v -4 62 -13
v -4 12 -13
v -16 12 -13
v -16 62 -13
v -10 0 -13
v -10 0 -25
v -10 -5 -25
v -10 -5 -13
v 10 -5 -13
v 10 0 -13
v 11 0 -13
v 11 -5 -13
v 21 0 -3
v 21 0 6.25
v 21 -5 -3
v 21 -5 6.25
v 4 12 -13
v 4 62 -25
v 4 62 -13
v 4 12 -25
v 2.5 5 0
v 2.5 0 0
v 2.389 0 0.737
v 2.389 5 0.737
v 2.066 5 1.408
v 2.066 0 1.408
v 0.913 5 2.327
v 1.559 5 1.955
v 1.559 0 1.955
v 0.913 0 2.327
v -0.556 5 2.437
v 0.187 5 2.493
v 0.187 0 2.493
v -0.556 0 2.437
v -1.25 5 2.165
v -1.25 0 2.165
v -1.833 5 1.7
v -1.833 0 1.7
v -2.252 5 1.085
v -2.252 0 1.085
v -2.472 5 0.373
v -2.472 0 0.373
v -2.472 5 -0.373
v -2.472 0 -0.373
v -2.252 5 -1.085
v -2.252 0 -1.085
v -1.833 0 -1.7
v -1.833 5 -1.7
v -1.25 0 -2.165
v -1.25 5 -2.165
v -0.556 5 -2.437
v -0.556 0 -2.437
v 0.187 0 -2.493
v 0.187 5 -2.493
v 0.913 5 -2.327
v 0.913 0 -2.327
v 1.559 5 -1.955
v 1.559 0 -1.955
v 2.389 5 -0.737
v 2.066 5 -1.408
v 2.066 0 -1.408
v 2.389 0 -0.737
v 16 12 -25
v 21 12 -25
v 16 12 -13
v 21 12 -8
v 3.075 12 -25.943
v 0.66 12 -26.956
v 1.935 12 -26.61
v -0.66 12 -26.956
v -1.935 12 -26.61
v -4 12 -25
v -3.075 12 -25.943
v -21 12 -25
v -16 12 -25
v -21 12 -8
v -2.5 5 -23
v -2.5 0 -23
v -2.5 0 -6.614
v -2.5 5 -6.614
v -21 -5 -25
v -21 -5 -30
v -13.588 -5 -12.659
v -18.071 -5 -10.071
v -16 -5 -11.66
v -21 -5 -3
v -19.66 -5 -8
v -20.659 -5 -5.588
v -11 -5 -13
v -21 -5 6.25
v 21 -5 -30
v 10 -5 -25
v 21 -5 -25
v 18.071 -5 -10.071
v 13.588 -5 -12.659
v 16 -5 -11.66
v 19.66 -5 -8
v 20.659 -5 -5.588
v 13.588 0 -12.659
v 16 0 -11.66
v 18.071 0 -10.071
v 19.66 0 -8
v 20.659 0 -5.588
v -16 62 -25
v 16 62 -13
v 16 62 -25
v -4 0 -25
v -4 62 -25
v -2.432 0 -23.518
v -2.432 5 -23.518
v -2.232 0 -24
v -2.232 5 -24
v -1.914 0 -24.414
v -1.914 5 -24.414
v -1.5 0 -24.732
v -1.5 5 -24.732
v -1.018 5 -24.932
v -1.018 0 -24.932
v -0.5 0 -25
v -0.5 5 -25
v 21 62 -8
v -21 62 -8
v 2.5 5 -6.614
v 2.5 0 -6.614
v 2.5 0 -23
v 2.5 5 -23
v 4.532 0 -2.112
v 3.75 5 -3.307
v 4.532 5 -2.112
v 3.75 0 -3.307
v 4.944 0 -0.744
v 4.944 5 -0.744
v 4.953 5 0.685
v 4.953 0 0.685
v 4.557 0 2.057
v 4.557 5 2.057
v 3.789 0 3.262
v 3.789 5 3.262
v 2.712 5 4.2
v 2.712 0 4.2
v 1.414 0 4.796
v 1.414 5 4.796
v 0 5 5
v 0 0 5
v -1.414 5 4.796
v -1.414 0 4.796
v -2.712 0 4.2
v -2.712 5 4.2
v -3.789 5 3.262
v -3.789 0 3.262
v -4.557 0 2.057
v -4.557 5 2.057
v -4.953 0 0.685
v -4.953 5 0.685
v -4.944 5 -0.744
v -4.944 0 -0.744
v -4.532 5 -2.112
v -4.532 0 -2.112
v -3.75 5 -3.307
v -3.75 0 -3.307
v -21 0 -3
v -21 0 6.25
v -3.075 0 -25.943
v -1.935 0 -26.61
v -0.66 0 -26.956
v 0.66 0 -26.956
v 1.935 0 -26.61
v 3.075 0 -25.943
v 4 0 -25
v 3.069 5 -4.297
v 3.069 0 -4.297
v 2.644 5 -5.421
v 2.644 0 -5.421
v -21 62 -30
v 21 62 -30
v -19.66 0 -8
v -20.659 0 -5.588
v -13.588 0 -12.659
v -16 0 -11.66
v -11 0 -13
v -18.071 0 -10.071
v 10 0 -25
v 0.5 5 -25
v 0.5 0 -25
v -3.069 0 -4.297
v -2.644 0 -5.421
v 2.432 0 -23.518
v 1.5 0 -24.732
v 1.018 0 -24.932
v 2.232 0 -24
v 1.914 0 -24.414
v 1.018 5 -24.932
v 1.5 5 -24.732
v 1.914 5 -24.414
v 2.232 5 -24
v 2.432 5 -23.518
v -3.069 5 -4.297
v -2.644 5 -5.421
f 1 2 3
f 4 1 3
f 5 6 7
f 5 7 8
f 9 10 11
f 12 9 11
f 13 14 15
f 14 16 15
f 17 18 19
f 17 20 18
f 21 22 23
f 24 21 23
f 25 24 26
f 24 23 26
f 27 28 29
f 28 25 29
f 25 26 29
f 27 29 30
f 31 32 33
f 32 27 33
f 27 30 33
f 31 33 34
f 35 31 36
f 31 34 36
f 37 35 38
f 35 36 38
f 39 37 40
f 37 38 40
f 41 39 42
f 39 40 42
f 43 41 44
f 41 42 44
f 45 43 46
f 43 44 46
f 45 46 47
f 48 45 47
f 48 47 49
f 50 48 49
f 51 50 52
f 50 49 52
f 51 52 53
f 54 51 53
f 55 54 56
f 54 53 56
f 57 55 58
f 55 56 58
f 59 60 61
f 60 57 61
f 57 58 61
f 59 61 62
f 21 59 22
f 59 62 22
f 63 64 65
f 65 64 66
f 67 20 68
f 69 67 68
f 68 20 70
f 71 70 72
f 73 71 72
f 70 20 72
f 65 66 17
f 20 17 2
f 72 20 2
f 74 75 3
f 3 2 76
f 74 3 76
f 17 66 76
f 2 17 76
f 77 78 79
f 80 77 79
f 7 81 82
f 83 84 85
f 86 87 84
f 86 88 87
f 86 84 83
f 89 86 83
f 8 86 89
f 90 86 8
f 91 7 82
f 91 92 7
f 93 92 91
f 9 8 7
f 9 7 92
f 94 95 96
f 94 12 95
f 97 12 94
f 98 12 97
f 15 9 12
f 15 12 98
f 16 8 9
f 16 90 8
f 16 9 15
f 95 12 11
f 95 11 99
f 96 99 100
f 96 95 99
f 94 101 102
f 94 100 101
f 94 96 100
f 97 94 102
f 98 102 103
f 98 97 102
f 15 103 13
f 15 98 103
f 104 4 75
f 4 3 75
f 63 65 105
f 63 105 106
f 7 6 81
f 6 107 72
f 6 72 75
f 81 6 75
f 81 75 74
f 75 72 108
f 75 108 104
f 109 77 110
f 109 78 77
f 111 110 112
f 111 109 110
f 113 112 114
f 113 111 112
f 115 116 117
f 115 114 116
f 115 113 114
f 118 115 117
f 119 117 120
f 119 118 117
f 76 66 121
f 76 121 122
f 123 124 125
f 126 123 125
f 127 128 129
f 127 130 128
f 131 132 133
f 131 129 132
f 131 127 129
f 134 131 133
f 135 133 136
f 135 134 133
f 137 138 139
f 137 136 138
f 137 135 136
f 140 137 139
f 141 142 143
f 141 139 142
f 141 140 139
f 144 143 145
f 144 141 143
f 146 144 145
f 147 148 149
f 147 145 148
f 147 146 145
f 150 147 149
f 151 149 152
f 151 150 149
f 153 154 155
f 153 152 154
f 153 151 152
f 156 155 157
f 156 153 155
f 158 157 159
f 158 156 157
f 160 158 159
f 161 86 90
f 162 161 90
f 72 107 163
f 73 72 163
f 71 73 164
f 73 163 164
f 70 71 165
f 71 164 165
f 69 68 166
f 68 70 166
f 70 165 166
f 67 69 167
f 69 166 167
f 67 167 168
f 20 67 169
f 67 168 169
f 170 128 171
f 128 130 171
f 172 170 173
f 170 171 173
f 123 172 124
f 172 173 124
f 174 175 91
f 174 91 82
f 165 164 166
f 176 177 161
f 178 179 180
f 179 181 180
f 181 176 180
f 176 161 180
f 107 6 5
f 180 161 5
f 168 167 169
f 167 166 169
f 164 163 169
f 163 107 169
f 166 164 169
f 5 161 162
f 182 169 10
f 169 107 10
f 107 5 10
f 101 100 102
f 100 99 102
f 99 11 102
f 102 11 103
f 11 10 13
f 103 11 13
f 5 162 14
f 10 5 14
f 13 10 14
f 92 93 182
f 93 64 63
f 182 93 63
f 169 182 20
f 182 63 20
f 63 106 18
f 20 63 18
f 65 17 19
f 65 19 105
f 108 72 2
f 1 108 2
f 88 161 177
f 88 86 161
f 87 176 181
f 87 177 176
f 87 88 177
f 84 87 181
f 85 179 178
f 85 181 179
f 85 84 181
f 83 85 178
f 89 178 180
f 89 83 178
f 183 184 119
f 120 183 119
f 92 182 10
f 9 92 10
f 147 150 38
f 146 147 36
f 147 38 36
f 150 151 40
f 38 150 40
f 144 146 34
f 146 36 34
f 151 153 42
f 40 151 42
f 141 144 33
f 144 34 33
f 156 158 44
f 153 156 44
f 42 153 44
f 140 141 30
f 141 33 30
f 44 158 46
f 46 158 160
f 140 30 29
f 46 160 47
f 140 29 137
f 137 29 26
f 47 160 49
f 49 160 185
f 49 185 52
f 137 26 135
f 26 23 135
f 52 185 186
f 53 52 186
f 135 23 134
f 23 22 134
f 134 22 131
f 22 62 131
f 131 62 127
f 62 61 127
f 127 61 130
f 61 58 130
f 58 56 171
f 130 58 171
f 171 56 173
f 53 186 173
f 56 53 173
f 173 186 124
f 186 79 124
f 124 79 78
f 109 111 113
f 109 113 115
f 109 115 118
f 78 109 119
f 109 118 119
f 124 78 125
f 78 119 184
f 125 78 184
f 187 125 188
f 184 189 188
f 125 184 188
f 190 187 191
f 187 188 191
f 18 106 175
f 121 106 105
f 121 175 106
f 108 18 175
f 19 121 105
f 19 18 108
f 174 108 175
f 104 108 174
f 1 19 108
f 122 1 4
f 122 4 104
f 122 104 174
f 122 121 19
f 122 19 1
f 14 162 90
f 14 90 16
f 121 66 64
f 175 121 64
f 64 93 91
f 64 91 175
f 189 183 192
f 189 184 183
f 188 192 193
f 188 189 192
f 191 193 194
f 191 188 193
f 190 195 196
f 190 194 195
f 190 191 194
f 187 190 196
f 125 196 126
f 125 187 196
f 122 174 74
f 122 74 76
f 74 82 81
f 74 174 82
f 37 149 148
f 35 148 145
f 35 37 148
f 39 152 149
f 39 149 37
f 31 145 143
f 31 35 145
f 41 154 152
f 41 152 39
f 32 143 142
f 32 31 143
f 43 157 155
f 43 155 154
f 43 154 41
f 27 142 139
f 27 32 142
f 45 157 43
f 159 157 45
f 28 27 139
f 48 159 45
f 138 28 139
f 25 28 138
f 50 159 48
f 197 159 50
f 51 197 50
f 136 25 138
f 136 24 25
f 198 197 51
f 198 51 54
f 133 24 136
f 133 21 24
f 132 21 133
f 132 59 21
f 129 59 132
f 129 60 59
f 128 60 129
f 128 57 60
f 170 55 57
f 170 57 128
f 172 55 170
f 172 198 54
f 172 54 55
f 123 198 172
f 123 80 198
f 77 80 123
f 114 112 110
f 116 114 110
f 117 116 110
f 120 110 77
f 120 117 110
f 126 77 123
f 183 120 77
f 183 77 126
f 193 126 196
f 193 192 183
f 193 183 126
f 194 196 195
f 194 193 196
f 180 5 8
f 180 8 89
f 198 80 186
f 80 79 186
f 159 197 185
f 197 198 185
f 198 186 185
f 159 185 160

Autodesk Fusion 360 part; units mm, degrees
sketch "Sketch1" plane through (0, 0, 0) normal (0, 1, 0) x (1, 0, 0)
  circle A0 centre (0, 0) radius 2.5
  line L0 (2.5, 6.6144) -> (2.5, 23)
  line L1 (0.5, 25) -> (-0.5, 25)
  line L2 (-2.5, 23) -> (-2.5, 6.6144)
  arc A1 (-3.75, 3.3072) -> (3.75, 3.3072) centre (0, 0) ccw
  arc A2 (-3.75, 3.3072) -> (-2.5, 6.6144) centre (-7.5, 6.6144) ccw
  arc A3 (2.5, 6.6144) -> (3.75, 3.3072) centre (7.5, 6.6144) ccw
  arc A4 (-0.5, 25) -> (-2.5, 23) centre (-0.5, 23) ccw
  arc A5 (2.5, 23) -> (0.5, 25) centre (0.5, 23) ccw
  dimension "d1" = 5
  dimension "d2" = 10
  dimension "d5" = 5
  dimension "d6" = 2
extrude "Extrude1" add sketch "Sketch1" along normal blind 5 makes body 1
sketch "Sketch5" plane through (0, 0, 0) normal (0, -1, 0) x (1, 0, 0)
  circle A0 centre (0, 0) radius 2.5
  line L0 (2.5, -23) -> (2.5, -6.6144)
  arc A1 (3.75, -3.3072) -> (2.5, -6.6144) centre (7.5, -6.6144) ccw
  arc A2 (3.75, -3.3072) -> (-3.75, -3.3072) centre (0, 0) ccw
  arc A3 (-2.5, -6.6144) -> (-3.75, -3.3072) centre (-7.5, -6.6144) ccw
  line L1 (-2.5, -6.6144) -> (-2.5, -23)
  arc A4 (-2.5, -23) -> (-0.5, -25) centre (-0.5, -23) ccw
  line L2 (-0.5, -25) -> (0.5, -25)
  arc A5 (0.5, -25) -> (2.5, -23) centre (0.5, -23) ccw
  line L3 (0, 6.25) -> (21, 6.25)
  line L4 (21, 6.25) -> (21, -30)
  line L5 (21, -30) -> (0, -30)
  line L6 (0, 6.25) -> (-21, 6.25)
  line L7 (-21, 6.25) -> (-21, -30)
  line L8 (-21, -30) -> (0, -30)
  dimension "d42" = 6.25
  dimension "d49" = 21
  dimension "d50" = 36.25
extrude "Extrude5" add sketch "Sketch5" along normal blind 5 separate body contours A0 | L0 A1 A2 A3 L1 A4 L2 A5 | L3 L4 L5 L6 L7 L8 makes body 2
sketch "Sketch6" plane through (0, 0, 0) normal (0, 1, 0) x (-1, 0, 0)
  line L0 (21, 6.25) -> (-21, 6.25)
  line L1 (-21, 6.25) -> (-21, -30)
  line L2 (-21, -30) -> (21, -30)
  line L3 (21, -30) -> (21, 6.25)
  line L4 (21, -30) -> (16, -30)
  line L5 (16, -25) -> (21, -25)
  line L6 (21, -25) -> (21, -30)
  line L7 (16, -25) -> (4, -25)
  line L8 (-4, -25) -> (-21, -25)
  arc A0 (-4, -25) -> (4, -25) centre (0, -22) ccw
  dimension "d53" = 5
  dimension "d54" = 5
  dimension "d55" = 12
extrude "Extrude6" add sketch "Sketch6" along normal blind 12 contours L1 L2 L3 L4 L5 L6 L7 L8 A0 bodies 2
sketch "Sketch7" plane through (0, 12, 0) normal (0, 1, 0) x (-1, 0, 0)
  line L0 (-21, -25) -> (-21, -30)
  line L1 (-21, -30) -> (21, -30)
  line L2 (21, -30) -> (21, -25)
  line L3 (21, -25) -> (4, -25)
  arc A0 (-4, -25) -> (4, -25) centre (0, -22) ccw
  line L4 (-4, -25) -> (-21, -25)
  line L5 (16, -25) -> (4, -25)
  line L6 (4, -25) -> (4, -13)
  line L7 (4, -13) -> (16, -13)
  line L8 (16, -13) -> (16, -25)
  line L9 (-16, -25) -> (-4, -25)
  line L10 (-4, -25) -> (-4, -13)
  line L11 (-4, -13) -> (-16, -13)
  line L12 (-16, -13) -> (-16, -25)
  line L13 (21, -30) -> (-21, -30)
  line L14 (-21, -30) -> (-21, -8)
  line L15 (-21, -8) -> (21, -8)
  line L16 (21, -8) -> (21, -30)
  dimension "d60" = 12
  dimension "d61" = 12
  dimension "d62" = 42
  dimension "d63" = 22
extrude "Extrude7" add sketch "Sketch7" along normal blind 50 contours L0 L1 L2 L3 A0 L4 L5 L9 L13 L14 L16 | L3 A0 L4 L6 L7 L8 L10 L11 L12 L14 L15 L16 bodies 2
sketch "Sketch8" plane through (0, 0, 0) normal (0, 1, 0) x (-1, 0, 0)
  line L0 (4, -25) -> (21, -25)
  line L1 (21, -25) -> (21, 6.25)
  line L2 (21, 6.25) -> (-21, 6.25)
  line L3 (-21, 6.25) -> (-21, -25)
  line L4 (-21, -25) -> (-4, -25)
  arc A0 (-4, -25) -> (4, -25) centre (0, -22) ccw
  line L5 (21, -25) -> (10, -25)
  line L6 (10, -25) -> (10, -13)
  line L7 (10, -13) -> (21, -13)
  line L8 (21, -13) -> (21, -25)
  line L9 (-21, -13) -> (-21, -25)
  line L10 (-21, -25) -> (-10, -25)
  line L11 (-10, -25) -> (-10, -13)
  line L12 (-10, -13) -> (-21, -13)
extrude "Extrude8" cut sketch "Sketch8" against normal blind 5 contours L0 L1 L5 L6 L7 L8 | L3 L4 L9 L10 L11 L12 bodies 2
fillet "Fillet1" radius 10 2 edges at (-21, -2.5, -13) (21, -2.5, -13) on bodies 2
